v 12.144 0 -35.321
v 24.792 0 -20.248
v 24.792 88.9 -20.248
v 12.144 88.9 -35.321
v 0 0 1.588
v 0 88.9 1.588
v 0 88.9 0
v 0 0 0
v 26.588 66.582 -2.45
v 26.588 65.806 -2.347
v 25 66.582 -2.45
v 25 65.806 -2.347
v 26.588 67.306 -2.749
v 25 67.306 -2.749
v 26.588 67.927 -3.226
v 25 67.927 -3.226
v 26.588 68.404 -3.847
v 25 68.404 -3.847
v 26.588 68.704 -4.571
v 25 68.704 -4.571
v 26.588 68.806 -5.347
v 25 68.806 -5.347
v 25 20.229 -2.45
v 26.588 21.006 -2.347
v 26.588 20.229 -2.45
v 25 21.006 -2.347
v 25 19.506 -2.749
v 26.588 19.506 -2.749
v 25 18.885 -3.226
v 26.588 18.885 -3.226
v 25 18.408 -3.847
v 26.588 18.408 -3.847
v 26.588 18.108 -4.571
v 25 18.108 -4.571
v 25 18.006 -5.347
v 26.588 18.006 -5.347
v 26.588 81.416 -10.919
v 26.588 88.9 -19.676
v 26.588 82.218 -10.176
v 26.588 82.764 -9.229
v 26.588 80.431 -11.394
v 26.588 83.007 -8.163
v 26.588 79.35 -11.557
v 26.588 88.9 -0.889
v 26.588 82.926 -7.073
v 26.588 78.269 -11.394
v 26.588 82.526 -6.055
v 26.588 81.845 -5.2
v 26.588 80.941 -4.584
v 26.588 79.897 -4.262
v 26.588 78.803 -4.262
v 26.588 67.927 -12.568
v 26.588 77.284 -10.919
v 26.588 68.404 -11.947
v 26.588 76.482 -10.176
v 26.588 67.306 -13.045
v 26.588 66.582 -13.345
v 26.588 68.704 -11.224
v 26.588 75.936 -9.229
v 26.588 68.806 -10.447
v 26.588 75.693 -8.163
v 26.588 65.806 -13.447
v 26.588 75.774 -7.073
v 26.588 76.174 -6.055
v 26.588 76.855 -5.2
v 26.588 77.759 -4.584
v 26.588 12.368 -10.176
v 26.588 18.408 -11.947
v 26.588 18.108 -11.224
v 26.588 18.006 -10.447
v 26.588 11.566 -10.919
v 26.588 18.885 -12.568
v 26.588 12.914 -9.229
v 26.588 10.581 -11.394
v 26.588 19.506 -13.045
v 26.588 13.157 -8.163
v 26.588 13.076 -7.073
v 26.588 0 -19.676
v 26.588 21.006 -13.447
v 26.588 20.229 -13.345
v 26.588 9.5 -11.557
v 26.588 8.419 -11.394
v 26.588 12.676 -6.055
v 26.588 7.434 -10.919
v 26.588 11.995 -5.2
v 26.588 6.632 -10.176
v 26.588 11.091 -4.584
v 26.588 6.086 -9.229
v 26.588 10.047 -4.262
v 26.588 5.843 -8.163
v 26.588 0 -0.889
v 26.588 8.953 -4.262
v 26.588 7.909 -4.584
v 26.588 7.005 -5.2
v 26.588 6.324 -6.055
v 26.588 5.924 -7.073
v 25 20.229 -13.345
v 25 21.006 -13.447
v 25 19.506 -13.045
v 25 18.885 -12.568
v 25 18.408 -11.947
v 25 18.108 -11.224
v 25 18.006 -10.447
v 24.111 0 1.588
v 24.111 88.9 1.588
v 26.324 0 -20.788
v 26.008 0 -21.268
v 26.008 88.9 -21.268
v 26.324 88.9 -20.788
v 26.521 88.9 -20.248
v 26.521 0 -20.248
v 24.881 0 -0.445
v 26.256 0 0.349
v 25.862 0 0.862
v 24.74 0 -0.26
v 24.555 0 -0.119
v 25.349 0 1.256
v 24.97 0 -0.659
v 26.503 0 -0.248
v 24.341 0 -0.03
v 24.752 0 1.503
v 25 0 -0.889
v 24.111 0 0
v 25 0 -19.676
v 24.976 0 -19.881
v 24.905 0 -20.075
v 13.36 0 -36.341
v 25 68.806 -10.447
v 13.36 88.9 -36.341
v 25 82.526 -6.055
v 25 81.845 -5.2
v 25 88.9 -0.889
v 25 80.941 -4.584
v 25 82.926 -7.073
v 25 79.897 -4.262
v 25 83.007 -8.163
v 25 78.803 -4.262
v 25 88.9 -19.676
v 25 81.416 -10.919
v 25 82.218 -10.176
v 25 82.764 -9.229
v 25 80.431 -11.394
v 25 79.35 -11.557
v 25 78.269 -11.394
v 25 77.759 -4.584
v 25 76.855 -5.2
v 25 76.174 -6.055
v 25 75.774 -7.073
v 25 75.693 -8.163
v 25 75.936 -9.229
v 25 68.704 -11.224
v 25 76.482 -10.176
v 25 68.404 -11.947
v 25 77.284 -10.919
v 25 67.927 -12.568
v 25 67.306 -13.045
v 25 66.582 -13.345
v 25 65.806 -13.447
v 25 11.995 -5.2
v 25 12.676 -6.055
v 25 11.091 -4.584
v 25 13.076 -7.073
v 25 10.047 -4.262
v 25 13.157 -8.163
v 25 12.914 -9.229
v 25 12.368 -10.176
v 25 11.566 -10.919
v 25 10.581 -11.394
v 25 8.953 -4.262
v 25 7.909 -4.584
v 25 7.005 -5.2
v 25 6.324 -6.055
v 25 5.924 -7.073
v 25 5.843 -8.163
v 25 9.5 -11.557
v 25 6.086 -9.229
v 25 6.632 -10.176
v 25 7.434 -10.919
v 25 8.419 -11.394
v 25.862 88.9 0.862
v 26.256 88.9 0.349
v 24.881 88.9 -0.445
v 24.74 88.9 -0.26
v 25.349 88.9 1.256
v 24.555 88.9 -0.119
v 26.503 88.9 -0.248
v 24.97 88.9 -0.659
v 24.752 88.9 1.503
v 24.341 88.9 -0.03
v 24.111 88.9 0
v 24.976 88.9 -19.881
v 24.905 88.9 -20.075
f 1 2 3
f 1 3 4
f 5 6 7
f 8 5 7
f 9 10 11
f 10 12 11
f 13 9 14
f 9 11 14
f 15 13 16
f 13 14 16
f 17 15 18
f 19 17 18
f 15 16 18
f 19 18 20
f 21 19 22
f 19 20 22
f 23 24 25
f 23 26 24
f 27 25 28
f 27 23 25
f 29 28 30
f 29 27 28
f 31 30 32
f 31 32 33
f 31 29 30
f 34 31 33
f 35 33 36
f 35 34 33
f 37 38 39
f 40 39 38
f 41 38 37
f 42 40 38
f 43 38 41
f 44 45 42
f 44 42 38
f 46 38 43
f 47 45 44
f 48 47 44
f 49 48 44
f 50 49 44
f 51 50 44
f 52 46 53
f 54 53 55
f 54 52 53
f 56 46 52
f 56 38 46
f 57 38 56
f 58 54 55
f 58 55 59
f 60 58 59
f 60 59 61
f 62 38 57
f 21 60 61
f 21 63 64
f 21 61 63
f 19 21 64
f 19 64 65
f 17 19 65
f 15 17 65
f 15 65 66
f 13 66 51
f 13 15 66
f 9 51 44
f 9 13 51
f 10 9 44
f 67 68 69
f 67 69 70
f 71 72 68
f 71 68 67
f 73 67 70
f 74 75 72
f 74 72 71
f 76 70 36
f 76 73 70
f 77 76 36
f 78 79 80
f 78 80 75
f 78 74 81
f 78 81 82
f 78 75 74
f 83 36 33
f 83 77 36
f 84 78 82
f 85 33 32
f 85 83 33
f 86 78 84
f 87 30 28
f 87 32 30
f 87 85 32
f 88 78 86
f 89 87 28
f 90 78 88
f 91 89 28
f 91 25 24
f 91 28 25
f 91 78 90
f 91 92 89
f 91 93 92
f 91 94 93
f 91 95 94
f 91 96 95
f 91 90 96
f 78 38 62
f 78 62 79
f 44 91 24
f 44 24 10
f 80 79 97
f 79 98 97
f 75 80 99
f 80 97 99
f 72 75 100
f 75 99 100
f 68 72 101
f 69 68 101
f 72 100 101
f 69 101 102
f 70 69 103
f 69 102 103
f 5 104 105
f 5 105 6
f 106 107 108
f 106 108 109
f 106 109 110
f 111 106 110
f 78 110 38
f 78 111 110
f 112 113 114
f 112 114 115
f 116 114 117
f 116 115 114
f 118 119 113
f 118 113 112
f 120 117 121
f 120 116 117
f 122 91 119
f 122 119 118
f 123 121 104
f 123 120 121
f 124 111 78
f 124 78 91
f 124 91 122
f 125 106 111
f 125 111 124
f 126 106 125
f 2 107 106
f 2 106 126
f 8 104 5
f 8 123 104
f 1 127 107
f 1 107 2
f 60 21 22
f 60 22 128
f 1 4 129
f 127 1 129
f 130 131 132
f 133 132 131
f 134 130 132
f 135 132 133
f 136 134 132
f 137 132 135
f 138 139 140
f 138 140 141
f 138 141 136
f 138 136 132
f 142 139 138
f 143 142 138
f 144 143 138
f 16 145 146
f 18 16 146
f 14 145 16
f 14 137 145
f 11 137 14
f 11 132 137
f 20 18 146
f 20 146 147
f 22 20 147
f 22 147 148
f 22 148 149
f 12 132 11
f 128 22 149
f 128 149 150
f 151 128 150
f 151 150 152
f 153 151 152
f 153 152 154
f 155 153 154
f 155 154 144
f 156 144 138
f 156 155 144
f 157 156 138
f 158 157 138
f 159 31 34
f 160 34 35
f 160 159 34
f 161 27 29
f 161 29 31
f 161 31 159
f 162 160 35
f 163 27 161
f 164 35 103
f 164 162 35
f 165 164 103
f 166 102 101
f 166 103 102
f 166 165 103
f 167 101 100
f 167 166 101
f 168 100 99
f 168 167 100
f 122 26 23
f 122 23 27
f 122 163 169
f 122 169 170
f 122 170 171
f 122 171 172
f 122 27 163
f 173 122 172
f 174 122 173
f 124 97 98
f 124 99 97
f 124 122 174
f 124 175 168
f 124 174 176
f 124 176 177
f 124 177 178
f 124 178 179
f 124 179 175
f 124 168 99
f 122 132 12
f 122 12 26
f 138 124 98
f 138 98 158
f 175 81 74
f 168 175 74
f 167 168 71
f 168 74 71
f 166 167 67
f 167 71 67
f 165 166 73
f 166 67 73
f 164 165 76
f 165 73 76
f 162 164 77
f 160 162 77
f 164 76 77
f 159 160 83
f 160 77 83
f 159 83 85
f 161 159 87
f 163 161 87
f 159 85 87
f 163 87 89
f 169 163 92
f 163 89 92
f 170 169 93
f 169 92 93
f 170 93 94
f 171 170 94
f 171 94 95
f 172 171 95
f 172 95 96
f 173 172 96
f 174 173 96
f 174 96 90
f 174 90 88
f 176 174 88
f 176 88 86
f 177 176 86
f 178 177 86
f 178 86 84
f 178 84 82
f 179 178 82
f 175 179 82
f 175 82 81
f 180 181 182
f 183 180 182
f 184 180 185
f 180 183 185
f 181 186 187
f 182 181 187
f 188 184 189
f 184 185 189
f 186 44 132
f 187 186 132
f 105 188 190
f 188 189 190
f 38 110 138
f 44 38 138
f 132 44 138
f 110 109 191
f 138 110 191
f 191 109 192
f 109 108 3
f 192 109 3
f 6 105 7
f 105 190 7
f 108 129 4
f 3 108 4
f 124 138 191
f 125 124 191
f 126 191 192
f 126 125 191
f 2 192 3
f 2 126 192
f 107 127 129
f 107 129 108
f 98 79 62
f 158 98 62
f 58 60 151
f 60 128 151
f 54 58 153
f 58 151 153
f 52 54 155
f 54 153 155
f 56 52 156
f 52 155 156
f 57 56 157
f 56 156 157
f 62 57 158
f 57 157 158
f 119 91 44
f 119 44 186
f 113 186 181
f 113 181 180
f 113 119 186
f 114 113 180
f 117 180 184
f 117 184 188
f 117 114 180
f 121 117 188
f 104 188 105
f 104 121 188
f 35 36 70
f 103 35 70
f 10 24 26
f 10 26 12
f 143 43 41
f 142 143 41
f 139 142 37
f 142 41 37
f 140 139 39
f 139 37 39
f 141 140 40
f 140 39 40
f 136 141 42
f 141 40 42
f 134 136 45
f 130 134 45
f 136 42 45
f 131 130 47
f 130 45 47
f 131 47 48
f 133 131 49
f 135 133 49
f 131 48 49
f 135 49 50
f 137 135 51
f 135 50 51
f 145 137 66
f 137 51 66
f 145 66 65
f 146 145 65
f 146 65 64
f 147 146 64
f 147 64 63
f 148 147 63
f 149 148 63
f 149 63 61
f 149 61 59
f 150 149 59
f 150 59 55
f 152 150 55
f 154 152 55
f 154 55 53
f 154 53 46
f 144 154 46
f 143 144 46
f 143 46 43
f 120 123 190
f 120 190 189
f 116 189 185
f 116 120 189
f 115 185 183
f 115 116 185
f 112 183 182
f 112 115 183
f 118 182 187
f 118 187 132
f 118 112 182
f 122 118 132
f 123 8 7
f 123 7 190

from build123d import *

# Parameters (mm, degrees)
BASE_FLANGE1_DEPTH = 88.9
CUT_EXTRUDE1_REACH = 101.653
SKETCH6_R          = 3.667750264
SKETCH6_W          = 11.0998
SKETCH6_H          = 50.8
FILLET2_R          = 3


# Sheet-metal steps are written as plain solids
with BuildPart() as part:
    # Sketch1 → Base-Flange1 (new body)
    with BuildSketch(Plane(origin=(0, 0, 0), x_dir=(1, 0, 0), z_dir=(0, 1, 0))):
        with BuildLine():
            Line((0, 0), (24.111, 0))
            ThreePointArc((24.111, 0), (24.739617928, 0.260382072), (25, 0.889))
            Line((25, 0.889), (25, 19.676430462))
            ThreePointArc((25, 19.676430462), (24.94638674, 19.980486369), (24.79201351, 20.247868647))
            Line((24.79201351, 20.247868647), (12.144247806, 35.320888862))
            Line((12.144247806, 35.320888862), (13.36034336, 36.341314193))
            Line((13.36034336, 36.341314193), (26.008109063, 21.268293977))
            ThreePointArc((26.008109063, 21.268293977), (26.438148775, 20.523443347), (26.5875, 19.676430462))
            Line((26.5875, 19.676430462), (26.5875, 0.889))
            ThreePointArc((26.5875, 0.889), (25.862149944, -0.862149944), (24.111, -1.5875))
            Line((24.111, -1.5875), (0, -1.5875))
            Line((0, -1.5875), (0, 0))
        make_face()
    extrude(amount=BASE_FLANGE1_DEPTH)

    # Sketch6 → Cut-Extrude1 (cut, up to next)
    with BuildSketch(Plane(origin=(26.5875, 0, 0), x_dir=(0, 0, -1), z_dir=(1, 0, 0)), mode=Mode.PRIVATE) as cut_extrude1_sk1:
        with Locations((7.889, 79.35)):
            Circle(SKETCH6_R)
    cut_extrude1_tool1 = extrude(cut_extrude1_sk1.sketch, amount=-CUT_EXTRUDE1_REACH, mode=Mode.PRIVATE) & part.part
    # Sketch6 → Cut-Extrude1 (cut, up to next)
    with BuildSketch(Plane(origin=(26.5875, 0, 0), x_dir=(0, 0, -1), z_dir=(1, 0, 0)), mode=Mode.PRIVATE) as cut_extrude1_sk2:
        with Locations((7.889, 9.5)):
            Circle(SKETCH6_R)
    cut_extrude1_tool2 = extrude(cut_extrude1_sk2.sketch, amount=-CUT_EXTRUDE1_REACH, mode=Mode.PRIVATE) & part.part
    # Sketch6 → Cut-Extrude1 (cut, up to next)
    with BuildSketch(Plane(origin=(26.5875, 0, 0), x_dir=(0, 0, -1), z_dir=(1, 0, 0)), mode=Mode.PRIVATE) as cut_extrude1_sk3:
        with Locations((7.897214616, 43.4059352)):
            Rectangle(SKETCH6_W, SKETCH6_H)
    cut_extrude1_tool3 = extrude(cut_extrude1_sk3.sketch, amount=-CUT_EXTRUDE1_REACH, mode=Mode.PRIVATE) & part.part
    add(cut_extrude1_tool1.solids().sort_by_distance((26.5875, 79.35, -7.889))[0], mode=Mode.SUBTRACT)
    add(cut_extrude1_tool2.solids().sort_by_distance((26.5875, 9.5, -7.889))[0], mode=Mode.SUBTRACT)
    add(cut_extrude1_tool3.solids().sort_by_distance((26.5875, 43.405935, -7.897215))[0], mode=Mode.SUBTRACT)

    # Fillet2
    fillet2_edges = [part.edges().sort_by_distance(p)[0] for p in [
        (25.79375, 68.8059352, -13.447114616),
        (25.79375, 18.0059352, -13.447114616),
        (25.79375, 18.0059352, -2.347314616),
        (25.79375, 68.8059352, -2.347314616),
    ]]
    fillet(fillet2_edges, radius=FILLET2_R)


solid = part.part
